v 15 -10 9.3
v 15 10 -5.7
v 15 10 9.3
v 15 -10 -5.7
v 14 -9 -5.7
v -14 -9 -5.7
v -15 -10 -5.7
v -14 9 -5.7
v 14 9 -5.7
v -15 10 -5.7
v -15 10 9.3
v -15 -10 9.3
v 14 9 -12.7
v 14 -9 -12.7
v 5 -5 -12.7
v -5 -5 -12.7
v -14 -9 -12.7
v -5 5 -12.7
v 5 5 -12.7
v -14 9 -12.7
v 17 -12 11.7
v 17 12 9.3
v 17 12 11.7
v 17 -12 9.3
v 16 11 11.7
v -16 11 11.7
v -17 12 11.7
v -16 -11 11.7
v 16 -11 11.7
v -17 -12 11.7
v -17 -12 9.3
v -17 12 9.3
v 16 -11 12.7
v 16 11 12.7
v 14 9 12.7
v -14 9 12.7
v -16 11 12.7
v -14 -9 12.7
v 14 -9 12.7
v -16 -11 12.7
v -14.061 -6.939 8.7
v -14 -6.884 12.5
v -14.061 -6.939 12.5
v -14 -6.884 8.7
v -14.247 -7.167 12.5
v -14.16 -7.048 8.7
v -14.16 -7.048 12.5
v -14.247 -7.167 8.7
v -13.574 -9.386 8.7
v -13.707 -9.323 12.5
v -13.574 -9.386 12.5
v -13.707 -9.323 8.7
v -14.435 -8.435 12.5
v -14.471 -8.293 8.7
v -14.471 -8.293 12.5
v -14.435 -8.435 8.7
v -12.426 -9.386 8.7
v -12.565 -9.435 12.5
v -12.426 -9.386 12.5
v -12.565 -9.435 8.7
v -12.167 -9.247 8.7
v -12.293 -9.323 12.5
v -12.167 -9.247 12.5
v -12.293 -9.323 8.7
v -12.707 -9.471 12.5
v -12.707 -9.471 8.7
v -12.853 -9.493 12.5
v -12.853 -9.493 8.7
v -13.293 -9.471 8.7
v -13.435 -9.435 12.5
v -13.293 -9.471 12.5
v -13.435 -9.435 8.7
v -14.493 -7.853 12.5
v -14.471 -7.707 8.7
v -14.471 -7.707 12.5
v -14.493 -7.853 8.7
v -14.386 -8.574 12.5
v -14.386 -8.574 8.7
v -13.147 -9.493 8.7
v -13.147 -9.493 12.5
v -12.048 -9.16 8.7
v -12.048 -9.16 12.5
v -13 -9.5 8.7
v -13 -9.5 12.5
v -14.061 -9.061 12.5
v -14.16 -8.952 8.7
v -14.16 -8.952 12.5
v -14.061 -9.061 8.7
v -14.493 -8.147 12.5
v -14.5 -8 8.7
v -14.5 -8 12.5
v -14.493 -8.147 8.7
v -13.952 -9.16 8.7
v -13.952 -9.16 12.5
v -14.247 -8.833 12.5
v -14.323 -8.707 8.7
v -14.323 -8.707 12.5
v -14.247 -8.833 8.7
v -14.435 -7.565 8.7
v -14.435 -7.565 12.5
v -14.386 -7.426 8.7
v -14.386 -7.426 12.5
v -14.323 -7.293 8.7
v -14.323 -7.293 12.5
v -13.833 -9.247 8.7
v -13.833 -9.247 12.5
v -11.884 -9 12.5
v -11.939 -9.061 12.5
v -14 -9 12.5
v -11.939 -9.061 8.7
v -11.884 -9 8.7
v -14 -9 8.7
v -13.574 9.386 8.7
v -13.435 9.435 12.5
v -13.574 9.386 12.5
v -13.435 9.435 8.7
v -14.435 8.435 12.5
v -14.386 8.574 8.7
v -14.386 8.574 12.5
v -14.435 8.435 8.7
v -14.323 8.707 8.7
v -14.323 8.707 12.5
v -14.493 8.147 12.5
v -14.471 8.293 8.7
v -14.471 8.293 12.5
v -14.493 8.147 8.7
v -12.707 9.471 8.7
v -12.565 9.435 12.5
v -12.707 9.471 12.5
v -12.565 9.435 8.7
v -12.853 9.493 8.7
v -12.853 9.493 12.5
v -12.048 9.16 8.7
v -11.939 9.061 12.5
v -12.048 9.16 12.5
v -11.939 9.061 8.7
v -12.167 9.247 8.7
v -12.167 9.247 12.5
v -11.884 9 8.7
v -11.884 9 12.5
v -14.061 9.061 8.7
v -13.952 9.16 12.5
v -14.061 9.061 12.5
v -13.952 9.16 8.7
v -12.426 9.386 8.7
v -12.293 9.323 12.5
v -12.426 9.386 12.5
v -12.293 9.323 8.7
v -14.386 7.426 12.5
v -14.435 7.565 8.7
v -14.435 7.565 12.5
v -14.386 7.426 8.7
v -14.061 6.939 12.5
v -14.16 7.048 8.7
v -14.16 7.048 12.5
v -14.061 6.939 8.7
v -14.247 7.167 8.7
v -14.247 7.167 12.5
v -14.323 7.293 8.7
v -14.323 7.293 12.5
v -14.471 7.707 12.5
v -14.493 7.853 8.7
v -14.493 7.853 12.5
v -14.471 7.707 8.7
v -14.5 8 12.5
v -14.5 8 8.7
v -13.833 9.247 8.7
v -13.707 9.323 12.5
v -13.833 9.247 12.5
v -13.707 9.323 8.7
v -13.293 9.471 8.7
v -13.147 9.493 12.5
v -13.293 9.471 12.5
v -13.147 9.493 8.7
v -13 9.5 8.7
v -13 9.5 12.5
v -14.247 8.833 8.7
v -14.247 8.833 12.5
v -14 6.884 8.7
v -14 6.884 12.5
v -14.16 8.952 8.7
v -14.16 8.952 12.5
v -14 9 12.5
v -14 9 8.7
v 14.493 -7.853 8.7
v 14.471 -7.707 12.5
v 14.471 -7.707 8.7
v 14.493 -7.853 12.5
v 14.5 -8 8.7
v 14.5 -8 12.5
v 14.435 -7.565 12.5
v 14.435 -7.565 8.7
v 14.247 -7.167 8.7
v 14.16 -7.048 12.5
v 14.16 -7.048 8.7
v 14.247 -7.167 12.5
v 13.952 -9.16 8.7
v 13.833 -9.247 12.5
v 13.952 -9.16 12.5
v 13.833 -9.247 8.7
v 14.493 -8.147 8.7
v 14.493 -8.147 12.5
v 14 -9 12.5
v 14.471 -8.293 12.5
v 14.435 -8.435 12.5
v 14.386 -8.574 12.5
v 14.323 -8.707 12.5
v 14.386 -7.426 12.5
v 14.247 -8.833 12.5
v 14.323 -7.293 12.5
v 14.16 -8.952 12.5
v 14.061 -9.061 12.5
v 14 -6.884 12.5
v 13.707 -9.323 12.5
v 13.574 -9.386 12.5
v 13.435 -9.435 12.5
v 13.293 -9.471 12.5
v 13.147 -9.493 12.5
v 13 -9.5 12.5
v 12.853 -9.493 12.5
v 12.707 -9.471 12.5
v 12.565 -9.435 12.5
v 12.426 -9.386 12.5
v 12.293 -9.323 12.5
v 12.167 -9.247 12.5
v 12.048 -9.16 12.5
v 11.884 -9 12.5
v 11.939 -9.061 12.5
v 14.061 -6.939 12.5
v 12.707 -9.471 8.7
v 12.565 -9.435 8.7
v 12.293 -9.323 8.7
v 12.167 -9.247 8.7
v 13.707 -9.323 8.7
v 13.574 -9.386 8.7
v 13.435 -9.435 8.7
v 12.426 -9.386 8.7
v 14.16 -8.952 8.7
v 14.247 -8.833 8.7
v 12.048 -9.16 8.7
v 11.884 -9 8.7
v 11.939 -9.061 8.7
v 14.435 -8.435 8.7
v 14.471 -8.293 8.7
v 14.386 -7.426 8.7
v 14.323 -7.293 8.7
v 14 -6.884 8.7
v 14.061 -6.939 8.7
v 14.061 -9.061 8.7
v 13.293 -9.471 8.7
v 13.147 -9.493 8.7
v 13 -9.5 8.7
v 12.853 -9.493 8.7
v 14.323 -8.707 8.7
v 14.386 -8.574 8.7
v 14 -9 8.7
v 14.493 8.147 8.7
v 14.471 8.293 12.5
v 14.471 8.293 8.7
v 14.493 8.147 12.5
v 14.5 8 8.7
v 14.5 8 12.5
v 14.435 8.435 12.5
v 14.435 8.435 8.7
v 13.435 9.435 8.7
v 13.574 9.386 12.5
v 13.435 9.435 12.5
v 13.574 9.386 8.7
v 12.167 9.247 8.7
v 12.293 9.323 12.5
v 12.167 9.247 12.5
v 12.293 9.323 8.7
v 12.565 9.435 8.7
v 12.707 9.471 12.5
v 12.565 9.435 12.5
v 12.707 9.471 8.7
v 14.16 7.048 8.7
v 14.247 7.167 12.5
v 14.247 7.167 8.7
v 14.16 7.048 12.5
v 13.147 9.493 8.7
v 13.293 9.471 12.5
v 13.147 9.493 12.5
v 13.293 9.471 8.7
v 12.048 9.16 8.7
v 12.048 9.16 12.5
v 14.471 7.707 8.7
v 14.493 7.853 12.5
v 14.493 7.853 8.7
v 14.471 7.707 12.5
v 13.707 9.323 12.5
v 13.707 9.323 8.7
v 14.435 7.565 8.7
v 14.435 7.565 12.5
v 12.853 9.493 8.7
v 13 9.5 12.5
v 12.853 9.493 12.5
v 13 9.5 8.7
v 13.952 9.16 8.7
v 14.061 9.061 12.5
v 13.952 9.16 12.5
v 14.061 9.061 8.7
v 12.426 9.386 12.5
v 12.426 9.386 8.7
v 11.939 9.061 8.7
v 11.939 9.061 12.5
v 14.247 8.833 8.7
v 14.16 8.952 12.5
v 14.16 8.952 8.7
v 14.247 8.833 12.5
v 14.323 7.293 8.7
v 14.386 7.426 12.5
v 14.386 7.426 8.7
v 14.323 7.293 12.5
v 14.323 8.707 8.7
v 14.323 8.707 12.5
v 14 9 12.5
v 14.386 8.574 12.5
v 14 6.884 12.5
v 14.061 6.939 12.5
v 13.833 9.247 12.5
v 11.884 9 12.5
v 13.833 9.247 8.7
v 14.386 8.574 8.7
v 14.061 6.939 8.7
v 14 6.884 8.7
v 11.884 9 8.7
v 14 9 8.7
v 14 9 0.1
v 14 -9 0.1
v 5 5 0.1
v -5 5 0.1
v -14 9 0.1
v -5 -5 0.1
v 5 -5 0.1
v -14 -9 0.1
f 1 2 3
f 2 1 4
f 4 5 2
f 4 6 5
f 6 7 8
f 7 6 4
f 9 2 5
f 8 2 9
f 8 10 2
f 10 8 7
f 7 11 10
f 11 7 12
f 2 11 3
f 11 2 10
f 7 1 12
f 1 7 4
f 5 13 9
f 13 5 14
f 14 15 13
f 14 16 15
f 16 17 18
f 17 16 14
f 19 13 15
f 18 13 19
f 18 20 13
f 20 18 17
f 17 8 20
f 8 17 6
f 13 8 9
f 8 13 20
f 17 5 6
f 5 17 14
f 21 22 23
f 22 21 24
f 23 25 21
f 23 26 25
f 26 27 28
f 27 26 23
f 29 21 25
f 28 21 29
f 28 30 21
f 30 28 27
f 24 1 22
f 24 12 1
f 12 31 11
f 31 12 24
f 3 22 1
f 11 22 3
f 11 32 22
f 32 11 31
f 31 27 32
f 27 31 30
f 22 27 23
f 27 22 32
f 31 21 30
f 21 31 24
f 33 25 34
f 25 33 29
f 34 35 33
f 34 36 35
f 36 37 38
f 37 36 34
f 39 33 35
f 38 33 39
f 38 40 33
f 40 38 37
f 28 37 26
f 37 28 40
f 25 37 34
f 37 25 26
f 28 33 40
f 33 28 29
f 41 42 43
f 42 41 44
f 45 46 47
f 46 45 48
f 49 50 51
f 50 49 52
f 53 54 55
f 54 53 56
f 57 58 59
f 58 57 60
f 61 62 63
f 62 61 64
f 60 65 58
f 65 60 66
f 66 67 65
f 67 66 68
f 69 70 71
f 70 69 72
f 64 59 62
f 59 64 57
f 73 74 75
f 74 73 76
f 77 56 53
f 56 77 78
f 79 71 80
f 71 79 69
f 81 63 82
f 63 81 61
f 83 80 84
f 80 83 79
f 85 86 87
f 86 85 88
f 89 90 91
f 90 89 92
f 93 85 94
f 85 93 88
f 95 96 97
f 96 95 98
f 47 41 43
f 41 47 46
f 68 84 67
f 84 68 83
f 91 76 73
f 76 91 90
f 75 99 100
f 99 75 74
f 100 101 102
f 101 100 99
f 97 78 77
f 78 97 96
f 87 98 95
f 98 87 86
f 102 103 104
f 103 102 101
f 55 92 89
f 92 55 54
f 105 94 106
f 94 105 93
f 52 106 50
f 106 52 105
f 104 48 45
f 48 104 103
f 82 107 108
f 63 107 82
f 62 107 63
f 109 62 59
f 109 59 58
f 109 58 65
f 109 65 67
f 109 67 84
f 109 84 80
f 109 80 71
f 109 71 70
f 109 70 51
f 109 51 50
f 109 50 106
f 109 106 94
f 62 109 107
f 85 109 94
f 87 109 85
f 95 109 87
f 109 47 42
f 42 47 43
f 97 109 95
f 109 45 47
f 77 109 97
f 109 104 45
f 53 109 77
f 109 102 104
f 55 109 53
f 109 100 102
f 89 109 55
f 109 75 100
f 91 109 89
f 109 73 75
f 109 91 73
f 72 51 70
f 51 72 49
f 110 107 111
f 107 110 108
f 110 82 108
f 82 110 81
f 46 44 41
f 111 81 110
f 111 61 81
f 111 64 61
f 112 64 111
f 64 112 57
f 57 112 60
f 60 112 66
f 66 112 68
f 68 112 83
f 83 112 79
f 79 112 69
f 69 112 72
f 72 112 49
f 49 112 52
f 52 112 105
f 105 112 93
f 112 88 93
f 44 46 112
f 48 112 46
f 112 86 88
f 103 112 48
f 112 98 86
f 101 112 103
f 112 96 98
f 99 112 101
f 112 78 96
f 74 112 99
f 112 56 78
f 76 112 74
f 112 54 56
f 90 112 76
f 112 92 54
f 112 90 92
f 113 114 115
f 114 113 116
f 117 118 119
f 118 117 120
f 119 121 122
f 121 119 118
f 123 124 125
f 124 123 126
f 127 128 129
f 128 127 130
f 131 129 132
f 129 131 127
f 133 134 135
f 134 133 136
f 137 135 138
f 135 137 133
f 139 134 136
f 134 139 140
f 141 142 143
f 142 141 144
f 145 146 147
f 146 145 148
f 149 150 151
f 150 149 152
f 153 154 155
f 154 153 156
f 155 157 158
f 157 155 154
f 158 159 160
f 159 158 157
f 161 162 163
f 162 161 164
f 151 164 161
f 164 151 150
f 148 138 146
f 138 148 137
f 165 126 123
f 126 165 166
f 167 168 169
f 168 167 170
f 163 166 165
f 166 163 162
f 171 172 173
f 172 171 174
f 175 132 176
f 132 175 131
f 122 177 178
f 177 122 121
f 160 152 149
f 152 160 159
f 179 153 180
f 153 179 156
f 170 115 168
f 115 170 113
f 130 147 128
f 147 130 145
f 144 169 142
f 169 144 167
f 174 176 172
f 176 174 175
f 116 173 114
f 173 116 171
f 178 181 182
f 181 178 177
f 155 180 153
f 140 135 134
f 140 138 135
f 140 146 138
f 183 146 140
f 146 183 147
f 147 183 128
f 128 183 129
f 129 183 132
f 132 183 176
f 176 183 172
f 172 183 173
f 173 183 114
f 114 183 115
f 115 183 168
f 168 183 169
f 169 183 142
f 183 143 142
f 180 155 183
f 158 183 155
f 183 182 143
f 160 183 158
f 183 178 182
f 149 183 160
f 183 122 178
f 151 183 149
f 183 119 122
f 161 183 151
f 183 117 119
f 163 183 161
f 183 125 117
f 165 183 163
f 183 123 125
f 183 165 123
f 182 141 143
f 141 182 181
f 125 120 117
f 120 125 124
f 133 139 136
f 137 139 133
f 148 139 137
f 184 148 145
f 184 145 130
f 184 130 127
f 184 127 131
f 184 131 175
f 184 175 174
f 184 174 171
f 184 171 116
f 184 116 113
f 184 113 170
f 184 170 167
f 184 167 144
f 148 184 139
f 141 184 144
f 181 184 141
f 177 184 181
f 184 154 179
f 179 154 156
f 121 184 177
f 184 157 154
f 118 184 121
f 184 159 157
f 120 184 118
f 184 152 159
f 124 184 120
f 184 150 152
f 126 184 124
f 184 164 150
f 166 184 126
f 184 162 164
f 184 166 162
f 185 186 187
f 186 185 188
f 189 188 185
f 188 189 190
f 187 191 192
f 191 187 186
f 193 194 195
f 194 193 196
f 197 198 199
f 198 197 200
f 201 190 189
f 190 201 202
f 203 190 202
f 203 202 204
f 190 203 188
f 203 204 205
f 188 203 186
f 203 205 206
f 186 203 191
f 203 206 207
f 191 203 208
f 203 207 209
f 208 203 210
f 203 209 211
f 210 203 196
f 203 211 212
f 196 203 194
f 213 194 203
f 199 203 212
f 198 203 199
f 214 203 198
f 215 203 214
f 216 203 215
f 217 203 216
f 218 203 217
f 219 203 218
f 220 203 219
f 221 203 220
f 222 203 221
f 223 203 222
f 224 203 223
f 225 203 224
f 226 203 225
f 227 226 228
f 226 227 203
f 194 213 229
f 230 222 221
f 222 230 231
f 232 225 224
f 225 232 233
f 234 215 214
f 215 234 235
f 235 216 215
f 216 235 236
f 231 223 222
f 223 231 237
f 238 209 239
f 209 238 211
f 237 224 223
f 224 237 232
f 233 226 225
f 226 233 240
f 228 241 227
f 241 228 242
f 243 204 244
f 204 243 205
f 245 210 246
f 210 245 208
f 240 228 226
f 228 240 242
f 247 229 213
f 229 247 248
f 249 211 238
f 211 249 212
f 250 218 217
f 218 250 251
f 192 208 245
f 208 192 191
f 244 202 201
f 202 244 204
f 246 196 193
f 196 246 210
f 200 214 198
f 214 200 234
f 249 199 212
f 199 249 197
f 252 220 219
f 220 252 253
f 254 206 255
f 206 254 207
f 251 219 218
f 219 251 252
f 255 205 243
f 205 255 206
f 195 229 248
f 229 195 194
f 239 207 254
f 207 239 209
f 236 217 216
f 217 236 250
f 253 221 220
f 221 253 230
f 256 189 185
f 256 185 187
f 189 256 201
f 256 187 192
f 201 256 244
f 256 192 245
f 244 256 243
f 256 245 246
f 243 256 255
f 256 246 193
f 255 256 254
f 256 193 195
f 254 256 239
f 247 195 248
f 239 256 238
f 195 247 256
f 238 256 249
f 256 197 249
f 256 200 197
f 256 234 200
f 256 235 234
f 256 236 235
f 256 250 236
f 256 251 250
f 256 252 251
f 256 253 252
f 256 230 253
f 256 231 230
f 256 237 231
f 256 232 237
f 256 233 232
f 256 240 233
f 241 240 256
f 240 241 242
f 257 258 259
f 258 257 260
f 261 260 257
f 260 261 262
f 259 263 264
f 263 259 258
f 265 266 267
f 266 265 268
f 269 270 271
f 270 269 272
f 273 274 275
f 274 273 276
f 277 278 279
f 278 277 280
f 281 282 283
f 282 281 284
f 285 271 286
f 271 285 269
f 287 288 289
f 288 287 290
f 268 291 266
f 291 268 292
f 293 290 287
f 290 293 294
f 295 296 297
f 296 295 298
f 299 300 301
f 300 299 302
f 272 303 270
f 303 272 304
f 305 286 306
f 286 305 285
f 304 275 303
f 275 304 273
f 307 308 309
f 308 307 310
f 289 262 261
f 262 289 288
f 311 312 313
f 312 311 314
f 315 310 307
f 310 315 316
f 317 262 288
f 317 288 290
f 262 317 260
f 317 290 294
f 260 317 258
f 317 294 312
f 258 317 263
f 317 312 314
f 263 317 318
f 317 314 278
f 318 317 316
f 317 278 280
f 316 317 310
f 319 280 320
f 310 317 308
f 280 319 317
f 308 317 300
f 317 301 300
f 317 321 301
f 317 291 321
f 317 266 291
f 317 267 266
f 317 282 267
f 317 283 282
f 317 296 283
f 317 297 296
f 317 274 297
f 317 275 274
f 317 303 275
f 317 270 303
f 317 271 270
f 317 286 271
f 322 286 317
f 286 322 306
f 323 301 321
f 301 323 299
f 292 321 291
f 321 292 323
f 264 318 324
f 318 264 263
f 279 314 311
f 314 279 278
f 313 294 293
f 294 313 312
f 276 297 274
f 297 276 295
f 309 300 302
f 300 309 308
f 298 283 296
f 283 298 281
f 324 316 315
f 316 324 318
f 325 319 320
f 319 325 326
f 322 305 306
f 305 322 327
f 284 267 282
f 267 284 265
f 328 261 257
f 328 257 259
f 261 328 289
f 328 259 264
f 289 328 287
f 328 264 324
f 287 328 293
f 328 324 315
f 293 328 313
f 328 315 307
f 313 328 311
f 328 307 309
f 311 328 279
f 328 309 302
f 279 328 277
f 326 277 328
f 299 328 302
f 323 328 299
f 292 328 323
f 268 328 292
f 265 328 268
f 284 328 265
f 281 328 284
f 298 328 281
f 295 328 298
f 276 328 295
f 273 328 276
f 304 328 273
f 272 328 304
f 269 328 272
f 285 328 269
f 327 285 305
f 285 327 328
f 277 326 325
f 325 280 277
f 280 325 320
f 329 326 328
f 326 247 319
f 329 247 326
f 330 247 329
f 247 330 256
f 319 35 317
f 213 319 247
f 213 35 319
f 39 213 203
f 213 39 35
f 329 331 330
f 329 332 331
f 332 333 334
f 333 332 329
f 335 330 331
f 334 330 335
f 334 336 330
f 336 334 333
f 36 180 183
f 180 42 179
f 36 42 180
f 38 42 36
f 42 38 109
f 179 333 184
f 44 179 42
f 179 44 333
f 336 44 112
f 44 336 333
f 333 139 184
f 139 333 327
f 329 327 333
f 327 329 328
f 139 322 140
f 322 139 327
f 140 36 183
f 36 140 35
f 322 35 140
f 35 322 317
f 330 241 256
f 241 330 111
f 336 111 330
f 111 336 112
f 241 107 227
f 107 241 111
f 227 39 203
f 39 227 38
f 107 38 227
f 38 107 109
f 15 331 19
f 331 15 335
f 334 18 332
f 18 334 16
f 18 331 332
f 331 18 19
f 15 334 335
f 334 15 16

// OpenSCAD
$fn = 64;

module iec_connector_lugless() {
    // Dimensions (mm)
    body_w = 30;
    body_d = 20;
    body_h = 15;

    rear_w = 28;
    rear_d = 18;
    rear_h = 7;

    flange_w = 34;
    flange_d = 24;
    flange_h = 2;

    bezel_w = 32;
    bezel_d = 22;
    bezel_h = 1;

    // Cutouts
    front_recess_w = 28;
    front_recess_d = 18;
    front_recess_h = 12; // recess depth from front face

    socket_w = 10;
    socket_d = 10;

    // Screw holes (lugless: holes only, no lugs)
    hole_r = 1.5;

    // Overlap / epsilon
    ov = 0.4;

    total_front_stack = flange_h + bezel_h;
    total_h = rear_h + body_h + total_front_stack;

    // Z placement (overall centered at z=0)
    z0 = 0;
    z_rear_center   = z0 - total_h/2 + rear_h/2;
    z_body_center   = z0 - total_h/2 + rear_h + body_h/2;
    z_flange_center = z0 + total_h/2 - total_front_stack + flange_h/2;
    z_bezel_center  = z0 + total_h/2 - bezel_h/2;

    // Faces
    z_front_face = z0 + total_h/2;
    z_back_face  = z0 - total_h/2;

    // Hole placement within flange footprint
    hole_x = flange_w/2 - 4;
    hole_y = flange_d/2 - 4;

    difference() {
        // ONE connected solid (stacked with overlaps)
        union() {
            translate([0, 0, z_body_center])
                cube([body_w, body_d, body_h + ov], center=true);

            translate([0, 0, z_rear_center])
                cube([rear_w, rear_d, rear_h + ov], center=true);

            translate([0, 0, z_flange_center])
                cube([flange_w, flange_d, flange_h + ov], center=true);

            translate([0, 0, z_bezel_center])
                cube([bezel_w, bezel_d, bezel_h + ov], center=true);
        }

        // Front recess: starts at front face and goes inward
        recess_center_z = z_front_face - front_recess_h/2;
        translate([0, 0, recess_center_z])
            cube([front_recess_w, front_recess_d, front_recess_h + 2*ov], center=true);

        // Socket orifice: through-all (guaranteed to cut entire part)
        translate([0, 0, z0])
            cube([socket_w, socket_d, total_h + 4*ov], center=true);

        // Screw holes: through bezel+flange only (from front face inward)
        hole_depth = total_front_stack + 2*ov;
        hole_center_z = z_front_face - hole_depth/2;
        for (x = [-hole_x, hole_x])
            for (y = [-hole_y, hole_y])
                translate([x, y, hole_center_z])
                    cylinder(h=hole_depth, r=hole_r, center=true);
    }
}

iec_connector_lugless();
